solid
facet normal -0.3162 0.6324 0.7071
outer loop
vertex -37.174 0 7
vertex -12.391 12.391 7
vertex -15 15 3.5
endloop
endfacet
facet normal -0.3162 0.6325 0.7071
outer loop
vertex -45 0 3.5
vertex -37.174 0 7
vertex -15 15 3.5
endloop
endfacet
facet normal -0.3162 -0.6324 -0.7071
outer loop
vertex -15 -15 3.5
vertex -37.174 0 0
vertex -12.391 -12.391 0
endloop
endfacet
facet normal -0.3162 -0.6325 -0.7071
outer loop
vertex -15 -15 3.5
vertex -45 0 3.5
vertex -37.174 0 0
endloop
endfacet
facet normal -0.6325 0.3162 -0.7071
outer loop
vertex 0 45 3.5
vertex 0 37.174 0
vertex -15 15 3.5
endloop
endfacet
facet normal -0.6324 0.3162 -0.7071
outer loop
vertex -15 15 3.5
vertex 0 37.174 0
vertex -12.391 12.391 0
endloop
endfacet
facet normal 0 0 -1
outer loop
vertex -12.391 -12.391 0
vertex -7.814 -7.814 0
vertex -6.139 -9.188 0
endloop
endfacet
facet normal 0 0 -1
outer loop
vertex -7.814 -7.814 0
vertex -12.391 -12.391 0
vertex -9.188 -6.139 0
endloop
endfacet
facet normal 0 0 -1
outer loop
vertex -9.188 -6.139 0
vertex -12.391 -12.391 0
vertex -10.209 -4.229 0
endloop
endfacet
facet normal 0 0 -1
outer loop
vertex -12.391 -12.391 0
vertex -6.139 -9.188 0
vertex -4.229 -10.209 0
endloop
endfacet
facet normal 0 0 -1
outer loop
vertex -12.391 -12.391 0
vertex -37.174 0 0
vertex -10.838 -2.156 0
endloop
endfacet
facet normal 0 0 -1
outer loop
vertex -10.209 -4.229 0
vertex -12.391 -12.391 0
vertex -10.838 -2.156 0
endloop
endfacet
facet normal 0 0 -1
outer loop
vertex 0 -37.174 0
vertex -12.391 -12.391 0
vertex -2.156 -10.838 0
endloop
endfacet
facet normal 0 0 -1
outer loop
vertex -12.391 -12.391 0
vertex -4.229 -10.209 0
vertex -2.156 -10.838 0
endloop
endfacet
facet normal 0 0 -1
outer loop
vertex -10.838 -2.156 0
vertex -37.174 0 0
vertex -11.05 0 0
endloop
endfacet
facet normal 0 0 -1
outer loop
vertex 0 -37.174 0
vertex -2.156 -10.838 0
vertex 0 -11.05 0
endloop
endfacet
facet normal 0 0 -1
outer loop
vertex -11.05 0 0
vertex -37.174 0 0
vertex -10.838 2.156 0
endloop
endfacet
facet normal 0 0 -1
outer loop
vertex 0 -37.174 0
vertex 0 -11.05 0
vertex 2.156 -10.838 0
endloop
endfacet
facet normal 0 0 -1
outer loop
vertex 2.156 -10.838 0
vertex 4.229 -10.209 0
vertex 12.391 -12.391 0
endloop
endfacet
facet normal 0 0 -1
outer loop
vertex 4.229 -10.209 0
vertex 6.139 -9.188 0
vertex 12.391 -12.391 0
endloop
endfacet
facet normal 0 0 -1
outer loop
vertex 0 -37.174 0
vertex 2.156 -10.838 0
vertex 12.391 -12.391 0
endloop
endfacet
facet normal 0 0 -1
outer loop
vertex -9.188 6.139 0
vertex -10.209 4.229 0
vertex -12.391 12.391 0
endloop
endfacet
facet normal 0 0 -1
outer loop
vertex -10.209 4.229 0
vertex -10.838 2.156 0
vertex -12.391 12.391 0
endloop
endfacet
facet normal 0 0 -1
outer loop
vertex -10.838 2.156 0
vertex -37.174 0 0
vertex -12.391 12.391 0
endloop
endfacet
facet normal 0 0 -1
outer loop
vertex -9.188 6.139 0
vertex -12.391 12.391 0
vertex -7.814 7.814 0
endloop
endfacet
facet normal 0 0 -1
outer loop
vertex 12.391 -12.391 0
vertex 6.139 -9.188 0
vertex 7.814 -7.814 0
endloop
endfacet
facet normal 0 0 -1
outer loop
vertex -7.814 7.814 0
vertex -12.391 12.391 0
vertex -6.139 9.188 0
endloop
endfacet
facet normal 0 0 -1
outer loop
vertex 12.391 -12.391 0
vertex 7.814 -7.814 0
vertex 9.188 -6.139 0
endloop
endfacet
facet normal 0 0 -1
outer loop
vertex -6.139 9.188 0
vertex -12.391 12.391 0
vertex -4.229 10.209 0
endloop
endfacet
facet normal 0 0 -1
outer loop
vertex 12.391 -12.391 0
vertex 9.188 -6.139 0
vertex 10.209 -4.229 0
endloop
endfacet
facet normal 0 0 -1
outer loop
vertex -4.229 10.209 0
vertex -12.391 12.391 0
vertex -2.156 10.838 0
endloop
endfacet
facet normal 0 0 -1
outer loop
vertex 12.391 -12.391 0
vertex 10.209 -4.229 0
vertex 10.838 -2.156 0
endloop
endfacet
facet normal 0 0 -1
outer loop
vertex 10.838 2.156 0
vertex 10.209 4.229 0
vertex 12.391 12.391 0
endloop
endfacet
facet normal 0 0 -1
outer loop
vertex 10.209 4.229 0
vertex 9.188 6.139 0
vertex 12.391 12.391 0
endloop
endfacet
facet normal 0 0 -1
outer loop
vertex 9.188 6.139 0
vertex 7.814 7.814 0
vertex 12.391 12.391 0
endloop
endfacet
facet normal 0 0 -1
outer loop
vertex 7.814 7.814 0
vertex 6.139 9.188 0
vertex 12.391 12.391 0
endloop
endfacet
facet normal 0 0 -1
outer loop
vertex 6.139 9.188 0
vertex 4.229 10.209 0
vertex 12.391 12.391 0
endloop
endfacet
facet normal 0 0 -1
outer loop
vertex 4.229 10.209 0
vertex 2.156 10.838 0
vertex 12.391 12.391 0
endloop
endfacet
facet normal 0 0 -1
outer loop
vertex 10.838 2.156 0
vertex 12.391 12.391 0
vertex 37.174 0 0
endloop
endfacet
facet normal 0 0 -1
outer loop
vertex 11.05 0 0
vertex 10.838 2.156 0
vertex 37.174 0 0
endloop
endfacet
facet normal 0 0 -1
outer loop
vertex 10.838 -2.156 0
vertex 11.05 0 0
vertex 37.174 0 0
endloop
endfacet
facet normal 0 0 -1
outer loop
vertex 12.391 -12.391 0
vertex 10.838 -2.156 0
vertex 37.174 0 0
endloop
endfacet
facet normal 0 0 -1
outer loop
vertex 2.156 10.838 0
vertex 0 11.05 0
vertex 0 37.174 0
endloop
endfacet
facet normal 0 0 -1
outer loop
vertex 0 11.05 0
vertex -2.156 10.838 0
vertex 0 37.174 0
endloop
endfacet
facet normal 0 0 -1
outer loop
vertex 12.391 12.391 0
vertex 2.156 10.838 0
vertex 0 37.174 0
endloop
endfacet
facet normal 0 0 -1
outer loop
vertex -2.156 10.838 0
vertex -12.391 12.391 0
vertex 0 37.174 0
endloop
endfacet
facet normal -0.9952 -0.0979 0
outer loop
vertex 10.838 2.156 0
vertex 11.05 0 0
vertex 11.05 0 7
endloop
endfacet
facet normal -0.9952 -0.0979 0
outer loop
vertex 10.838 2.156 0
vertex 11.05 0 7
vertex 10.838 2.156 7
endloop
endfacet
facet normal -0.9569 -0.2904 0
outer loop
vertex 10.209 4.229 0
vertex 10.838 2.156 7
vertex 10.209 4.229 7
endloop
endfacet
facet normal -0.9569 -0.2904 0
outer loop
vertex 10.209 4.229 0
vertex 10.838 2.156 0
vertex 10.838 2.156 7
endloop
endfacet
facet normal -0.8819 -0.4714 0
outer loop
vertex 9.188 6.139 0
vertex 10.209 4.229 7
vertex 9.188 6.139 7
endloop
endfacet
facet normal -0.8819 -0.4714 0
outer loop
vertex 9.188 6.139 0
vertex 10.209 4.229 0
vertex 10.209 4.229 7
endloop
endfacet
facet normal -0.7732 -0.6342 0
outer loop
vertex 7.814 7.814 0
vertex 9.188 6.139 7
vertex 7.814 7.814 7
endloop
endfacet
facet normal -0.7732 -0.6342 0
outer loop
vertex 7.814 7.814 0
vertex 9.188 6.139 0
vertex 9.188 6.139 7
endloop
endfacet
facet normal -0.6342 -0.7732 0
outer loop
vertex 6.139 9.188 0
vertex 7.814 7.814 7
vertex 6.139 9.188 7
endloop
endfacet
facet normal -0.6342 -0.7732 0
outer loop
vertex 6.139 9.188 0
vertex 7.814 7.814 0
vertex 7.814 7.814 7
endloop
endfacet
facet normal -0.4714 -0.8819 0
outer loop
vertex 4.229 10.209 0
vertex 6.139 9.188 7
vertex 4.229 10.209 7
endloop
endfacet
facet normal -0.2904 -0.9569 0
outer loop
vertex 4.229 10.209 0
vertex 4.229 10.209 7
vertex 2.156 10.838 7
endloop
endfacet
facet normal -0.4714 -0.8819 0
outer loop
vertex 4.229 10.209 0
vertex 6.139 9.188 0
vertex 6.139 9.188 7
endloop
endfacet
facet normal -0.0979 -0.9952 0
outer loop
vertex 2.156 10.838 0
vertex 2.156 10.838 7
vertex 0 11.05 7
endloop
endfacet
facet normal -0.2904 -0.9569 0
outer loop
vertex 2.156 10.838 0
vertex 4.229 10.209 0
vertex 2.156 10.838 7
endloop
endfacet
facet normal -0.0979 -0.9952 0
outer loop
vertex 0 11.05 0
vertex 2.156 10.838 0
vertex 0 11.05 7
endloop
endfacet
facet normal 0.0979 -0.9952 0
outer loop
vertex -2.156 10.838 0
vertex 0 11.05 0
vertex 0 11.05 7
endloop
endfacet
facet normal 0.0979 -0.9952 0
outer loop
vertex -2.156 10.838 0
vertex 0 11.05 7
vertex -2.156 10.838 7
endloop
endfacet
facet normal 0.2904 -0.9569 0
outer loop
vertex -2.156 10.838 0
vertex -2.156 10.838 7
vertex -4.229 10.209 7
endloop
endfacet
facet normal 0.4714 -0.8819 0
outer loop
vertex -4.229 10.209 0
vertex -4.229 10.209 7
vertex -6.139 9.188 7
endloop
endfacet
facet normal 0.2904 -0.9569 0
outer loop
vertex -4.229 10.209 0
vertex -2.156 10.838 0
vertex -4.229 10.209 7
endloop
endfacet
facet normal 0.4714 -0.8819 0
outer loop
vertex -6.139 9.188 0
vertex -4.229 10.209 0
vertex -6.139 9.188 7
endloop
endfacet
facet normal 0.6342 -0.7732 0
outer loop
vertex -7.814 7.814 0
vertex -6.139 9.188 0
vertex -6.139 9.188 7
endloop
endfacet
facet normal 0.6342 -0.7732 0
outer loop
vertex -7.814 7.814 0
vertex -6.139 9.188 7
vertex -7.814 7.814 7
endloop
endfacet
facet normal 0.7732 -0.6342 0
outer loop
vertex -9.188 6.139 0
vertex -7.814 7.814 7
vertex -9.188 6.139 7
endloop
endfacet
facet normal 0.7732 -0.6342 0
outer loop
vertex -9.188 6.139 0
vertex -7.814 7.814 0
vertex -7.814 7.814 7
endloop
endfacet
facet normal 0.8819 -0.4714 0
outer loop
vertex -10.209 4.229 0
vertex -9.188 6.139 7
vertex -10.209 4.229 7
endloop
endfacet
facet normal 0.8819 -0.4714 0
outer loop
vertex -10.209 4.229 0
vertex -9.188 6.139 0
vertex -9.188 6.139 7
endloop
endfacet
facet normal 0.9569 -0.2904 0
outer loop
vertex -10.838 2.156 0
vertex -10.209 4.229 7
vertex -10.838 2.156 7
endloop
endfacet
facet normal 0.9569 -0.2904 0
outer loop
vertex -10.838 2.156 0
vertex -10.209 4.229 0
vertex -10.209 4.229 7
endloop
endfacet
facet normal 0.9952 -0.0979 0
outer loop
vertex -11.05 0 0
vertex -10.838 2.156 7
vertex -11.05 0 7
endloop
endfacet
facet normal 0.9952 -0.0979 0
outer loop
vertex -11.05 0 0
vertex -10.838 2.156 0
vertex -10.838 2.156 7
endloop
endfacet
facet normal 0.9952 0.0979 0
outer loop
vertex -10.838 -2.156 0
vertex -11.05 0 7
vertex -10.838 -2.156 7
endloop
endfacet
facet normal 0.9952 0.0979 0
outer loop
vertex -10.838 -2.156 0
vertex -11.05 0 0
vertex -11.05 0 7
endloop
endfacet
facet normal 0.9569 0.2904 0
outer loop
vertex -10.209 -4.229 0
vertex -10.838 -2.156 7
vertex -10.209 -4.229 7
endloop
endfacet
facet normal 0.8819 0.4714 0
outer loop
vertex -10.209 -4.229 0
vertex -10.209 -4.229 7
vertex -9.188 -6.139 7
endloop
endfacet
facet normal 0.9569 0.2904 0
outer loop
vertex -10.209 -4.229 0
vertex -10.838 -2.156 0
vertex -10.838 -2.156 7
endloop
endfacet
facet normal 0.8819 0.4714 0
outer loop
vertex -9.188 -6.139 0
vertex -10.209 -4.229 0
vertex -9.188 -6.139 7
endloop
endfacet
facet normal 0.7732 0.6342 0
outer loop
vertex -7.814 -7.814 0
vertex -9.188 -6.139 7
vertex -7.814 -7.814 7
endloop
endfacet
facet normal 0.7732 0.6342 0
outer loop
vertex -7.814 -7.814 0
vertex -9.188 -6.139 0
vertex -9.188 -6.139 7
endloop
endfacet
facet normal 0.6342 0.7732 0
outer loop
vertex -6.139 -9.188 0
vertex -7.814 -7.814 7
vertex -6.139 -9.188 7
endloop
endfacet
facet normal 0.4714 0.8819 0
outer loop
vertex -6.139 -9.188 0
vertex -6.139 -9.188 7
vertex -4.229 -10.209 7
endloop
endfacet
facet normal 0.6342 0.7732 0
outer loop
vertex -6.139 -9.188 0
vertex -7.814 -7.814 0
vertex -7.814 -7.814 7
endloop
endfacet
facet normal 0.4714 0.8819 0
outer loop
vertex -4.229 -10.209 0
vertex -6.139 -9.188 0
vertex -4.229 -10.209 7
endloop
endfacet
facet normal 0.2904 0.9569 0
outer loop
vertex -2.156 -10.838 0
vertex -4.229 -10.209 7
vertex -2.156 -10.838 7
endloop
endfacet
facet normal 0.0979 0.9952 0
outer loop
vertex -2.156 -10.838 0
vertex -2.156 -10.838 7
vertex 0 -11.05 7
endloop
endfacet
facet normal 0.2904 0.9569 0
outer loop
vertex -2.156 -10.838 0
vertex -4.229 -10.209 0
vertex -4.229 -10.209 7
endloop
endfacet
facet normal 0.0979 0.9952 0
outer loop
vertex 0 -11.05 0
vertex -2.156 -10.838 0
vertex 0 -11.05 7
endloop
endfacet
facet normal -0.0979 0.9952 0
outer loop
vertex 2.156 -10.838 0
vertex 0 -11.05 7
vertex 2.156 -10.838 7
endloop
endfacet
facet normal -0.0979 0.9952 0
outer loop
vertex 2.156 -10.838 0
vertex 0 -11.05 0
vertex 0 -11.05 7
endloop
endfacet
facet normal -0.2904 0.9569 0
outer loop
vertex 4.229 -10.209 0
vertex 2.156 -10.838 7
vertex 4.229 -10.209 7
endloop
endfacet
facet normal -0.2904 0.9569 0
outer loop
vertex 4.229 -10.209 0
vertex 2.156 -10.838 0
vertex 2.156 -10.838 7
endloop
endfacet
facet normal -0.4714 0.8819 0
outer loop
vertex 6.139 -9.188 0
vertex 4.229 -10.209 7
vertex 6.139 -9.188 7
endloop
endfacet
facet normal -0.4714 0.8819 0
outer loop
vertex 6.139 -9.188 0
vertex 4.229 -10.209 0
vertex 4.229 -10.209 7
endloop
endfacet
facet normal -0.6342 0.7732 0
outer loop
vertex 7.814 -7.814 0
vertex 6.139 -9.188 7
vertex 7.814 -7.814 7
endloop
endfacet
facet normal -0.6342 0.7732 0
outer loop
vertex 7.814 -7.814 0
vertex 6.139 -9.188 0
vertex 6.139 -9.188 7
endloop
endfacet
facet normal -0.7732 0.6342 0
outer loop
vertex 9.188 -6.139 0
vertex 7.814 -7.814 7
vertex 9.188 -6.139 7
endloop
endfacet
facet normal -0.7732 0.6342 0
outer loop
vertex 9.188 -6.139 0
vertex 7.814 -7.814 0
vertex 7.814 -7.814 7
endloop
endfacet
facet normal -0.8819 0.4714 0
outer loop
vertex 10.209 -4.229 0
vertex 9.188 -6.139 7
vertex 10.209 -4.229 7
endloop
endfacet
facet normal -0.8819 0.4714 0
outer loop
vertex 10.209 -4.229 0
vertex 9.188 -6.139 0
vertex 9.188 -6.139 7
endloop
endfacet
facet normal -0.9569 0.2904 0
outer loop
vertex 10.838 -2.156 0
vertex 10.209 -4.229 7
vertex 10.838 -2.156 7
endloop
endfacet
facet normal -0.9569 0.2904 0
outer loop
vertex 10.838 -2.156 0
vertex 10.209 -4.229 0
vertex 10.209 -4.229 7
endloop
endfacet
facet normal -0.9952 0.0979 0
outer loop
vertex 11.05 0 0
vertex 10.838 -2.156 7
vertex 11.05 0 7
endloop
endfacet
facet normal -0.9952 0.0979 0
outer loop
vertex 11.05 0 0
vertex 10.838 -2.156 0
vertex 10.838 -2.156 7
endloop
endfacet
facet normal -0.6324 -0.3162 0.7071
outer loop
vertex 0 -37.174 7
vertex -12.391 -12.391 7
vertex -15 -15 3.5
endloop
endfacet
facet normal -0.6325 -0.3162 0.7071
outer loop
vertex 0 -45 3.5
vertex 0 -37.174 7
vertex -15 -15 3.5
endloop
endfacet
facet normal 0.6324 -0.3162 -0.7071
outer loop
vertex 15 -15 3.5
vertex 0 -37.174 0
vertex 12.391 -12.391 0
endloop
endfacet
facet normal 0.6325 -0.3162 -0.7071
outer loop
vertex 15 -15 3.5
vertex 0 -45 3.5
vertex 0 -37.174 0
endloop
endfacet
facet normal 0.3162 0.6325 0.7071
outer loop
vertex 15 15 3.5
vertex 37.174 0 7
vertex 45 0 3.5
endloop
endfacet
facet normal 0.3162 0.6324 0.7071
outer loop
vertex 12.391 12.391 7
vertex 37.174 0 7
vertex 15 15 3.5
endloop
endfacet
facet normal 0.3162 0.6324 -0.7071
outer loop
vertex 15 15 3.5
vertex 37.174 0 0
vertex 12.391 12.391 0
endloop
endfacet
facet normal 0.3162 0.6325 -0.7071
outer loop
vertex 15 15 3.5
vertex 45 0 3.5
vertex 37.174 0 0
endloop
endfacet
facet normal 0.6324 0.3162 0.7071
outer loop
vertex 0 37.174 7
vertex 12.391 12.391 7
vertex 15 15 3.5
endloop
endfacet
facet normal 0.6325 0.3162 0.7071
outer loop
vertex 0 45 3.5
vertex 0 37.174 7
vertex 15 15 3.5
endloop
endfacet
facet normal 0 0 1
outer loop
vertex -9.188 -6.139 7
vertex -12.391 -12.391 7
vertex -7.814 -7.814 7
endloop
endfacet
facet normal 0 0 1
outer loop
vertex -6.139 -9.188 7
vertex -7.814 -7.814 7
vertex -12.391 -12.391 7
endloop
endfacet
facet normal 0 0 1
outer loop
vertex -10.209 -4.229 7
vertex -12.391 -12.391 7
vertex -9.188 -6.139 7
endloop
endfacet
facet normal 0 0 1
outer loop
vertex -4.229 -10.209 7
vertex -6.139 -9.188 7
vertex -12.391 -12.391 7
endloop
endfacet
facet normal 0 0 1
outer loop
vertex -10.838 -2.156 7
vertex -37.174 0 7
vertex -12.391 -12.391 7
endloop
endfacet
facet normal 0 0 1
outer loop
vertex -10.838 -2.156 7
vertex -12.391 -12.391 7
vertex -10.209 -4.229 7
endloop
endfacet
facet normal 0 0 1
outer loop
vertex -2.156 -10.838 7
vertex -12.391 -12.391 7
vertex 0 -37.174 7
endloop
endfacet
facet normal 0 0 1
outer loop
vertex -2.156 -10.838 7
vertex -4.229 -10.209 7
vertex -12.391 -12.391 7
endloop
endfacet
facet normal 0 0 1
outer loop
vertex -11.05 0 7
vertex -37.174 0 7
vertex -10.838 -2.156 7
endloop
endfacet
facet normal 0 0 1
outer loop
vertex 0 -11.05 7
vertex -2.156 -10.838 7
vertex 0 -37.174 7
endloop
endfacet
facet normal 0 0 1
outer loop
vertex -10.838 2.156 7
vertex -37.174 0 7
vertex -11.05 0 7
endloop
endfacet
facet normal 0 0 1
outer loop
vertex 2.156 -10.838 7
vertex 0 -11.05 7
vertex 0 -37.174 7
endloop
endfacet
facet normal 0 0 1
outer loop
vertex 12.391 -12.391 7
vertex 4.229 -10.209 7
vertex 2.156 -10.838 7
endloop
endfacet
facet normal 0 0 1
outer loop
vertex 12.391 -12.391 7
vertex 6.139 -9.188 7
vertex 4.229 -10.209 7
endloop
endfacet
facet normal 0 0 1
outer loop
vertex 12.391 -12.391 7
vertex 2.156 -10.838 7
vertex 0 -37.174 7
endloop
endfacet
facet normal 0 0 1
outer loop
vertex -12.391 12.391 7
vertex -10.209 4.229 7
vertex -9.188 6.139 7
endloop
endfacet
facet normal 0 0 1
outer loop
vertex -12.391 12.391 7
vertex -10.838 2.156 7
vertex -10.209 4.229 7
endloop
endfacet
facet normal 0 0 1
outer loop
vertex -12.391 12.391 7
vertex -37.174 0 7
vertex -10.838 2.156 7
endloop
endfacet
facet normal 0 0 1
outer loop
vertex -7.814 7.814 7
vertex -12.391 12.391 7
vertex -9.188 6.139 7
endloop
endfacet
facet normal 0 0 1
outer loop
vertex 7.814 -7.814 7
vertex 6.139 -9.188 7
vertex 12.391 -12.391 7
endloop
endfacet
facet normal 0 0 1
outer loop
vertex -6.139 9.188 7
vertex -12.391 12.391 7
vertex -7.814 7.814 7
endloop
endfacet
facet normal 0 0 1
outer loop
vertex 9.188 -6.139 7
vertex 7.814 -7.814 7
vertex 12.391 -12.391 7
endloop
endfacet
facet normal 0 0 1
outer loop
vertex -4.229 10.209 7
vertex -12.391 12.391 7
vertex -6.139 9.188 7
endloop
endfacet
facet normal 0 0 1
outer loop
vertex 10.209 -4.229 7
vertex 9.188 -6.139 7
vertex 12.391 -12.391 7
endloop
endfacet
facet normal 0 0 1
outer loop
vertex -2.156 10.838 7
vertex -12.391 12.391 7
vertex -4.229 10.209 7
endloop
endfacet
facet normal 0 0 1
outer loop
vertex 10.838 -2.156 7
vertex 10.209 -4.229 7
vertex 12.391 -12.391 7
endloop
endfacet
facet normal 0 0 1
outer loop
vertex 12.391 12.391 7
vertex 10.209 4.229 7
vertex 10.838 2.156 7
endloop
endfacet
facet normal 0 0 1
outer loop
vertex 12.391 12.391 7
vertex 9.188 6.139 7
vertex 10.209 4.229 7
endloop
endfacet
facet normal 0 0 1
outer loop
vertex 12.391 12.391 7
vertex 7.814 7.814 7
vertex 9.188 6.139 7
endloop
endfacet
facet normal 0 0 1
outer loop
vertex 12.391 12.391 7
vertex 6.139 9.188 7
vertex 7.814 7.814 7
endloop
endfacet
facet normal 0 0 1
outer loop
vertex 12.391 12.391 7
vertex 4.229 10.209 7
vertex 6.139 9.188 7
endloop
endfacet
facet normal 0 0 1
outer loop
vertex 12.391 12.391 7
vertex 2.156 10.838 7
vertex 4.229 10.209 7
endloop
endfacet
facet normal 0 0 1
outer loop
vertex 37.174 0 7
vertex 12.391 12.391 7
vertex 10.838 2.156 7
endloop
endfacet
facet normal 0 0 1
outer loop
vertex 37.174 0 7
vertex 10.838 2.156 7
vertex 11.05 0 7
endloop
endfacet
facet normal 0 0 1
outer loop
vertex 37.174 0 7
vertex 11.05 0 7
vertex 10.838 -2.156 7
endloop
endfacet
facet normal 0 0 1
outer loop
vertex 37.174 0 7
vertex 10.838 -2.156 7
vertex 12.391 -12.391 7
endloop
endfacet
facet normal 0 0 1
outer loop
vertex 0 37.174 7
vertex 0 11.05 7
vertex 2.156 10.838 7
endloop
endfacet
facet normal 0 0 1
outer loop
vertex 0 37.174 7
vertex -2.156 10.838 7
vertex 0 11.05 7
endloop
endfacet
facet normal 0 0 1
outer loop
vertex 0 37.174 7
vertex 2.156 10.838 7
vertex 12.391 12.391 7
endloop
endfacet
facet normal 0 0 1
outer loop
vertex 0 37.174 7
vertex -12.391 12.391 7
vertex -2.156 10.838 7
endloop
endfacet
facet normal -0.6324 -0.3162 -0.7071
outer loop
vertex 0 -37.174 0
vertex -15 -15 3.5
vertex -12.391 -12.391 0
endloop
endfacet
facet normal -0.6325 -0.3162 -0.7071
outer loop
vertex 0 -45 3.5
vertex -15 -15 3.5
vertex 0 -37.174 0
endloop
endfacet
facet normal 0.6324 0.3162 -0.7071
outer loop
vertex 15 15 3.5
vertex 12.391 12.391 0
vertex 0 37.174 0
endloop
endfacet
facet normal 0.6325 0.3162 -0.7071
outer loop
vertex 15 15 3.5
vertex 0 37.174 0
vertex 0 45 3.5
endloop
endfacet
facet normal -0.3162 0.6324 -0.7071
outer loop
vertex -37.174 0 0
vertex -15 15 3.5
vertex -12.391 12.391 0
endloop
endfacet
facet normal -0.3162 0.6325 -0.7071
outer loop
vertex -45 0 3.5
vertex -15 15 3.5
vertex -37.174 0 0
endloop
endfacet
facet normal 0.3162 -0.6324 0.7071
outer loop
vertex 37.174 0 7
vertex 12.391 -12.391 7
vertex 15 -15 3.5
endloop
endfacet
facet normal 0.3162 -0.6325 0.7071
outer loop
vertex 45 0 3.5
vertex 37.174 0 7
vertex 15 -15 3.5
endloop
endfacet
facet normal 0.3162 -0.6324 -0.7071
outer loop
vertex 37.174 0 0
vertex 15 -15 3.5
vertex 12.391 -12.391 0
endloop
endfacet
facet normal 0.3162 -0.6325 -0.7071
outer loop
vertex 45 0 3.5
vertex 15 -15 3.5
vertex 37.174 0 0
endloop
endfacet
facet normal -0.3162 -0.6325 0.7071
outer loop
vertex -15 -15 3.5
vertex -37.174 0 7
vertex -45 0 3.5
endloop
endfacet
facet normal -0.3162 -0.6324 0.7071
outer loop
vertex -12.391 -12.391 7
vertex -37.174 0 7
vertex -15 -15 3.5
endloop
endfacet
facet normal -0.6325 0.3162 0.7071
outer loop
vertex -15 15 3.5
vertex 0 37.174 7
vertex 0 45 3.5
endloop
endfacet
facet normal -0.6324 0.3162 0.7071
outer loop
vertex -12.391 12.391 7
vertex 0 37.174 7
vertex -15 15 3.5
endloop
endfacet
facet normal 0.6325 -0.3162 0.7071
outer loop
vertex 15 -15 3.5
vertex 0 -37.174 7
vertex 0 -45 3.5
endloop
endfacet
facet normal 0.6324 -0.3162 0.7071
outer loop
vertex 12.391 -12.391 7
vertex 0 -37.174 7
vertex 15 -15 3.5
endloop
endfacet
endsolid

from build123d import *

# Parameters (mm, degrees)
F0_R     = 11.05
F1_DEPTH = 7
F2_SIZE  = 3.5
F3_SIZE  = 3.49999


# Not quite as in the source:
# - a fillet or chamfer is up to 0.001 mm smaller than in the source, because OpenCascade refuses the exact size


with BuildPart() as f1:
    # F0 (on Top) → F1 (new body)
    with BuildSketch(Plane.XY):
        Polygon((0, 45), (-15, 15), (0, 15), align=None)
        Polygon((0, 45), (0, 15), (15, 15), align=None)
        Polygon((0, 15), (-15, 15), (-15, 0), (-15, -15), (0, -15), (15, -15), (15, 0), (15, 15), align=None)
        Circle(F0_R, mode=Mode.SUBTRACT)
        Polygon((-15, -15), (-15, 0), (-45, 0), align=None)
        Polygon((-15, 0), (-15, 15), (-45, 0), align=None)
        Polygon((0, -15), (-15, -15), (0, -45), align=None)
        Polygon((15, -15), (0, -15), (0, -45), align=None)
        Polygon((45, 0), (15, 0), (15, -15), align=None)
        Polygon((45, 0), (15, 15), (15, 0), align=None)
    extrude(amount=F1_DEPTH)

    # F2
    f2_edges = [f1.edges().sort_by_distance(p)[0] for p in [
        (30, -7.5, 7),
        (7.5, -30, 7),
        (-7.5, -30, 7),
        (-30, -7.5, 7),
        (-30, 7.5, 7),
        (-7.5, 30, 7),
        (7.5, 30, 7),
        (30, 7.5, 7),
    ]]
    chamfer(f2_edges, length=F2_SIZE)

    # F3 (size 3.5 in the source; OpenCascade refuses exactly that, so slightly less here)
    f3_edges = [f1.edges().sort_by_distance(p)[0] for p in [
        (30, 7.5, 0),
        (7.5, 30, 0),
        (-7.5, 30, 0),
        (-30, 7.5, 0),
        (-30, -7.5, 0),
        (-7.5, -30, 0),
        (7.5, -30, 0),
        (30, -7.5, 0),
    ]]
    chamfer(f3_edges, length=F3_SIZE)


solid = f1.part
